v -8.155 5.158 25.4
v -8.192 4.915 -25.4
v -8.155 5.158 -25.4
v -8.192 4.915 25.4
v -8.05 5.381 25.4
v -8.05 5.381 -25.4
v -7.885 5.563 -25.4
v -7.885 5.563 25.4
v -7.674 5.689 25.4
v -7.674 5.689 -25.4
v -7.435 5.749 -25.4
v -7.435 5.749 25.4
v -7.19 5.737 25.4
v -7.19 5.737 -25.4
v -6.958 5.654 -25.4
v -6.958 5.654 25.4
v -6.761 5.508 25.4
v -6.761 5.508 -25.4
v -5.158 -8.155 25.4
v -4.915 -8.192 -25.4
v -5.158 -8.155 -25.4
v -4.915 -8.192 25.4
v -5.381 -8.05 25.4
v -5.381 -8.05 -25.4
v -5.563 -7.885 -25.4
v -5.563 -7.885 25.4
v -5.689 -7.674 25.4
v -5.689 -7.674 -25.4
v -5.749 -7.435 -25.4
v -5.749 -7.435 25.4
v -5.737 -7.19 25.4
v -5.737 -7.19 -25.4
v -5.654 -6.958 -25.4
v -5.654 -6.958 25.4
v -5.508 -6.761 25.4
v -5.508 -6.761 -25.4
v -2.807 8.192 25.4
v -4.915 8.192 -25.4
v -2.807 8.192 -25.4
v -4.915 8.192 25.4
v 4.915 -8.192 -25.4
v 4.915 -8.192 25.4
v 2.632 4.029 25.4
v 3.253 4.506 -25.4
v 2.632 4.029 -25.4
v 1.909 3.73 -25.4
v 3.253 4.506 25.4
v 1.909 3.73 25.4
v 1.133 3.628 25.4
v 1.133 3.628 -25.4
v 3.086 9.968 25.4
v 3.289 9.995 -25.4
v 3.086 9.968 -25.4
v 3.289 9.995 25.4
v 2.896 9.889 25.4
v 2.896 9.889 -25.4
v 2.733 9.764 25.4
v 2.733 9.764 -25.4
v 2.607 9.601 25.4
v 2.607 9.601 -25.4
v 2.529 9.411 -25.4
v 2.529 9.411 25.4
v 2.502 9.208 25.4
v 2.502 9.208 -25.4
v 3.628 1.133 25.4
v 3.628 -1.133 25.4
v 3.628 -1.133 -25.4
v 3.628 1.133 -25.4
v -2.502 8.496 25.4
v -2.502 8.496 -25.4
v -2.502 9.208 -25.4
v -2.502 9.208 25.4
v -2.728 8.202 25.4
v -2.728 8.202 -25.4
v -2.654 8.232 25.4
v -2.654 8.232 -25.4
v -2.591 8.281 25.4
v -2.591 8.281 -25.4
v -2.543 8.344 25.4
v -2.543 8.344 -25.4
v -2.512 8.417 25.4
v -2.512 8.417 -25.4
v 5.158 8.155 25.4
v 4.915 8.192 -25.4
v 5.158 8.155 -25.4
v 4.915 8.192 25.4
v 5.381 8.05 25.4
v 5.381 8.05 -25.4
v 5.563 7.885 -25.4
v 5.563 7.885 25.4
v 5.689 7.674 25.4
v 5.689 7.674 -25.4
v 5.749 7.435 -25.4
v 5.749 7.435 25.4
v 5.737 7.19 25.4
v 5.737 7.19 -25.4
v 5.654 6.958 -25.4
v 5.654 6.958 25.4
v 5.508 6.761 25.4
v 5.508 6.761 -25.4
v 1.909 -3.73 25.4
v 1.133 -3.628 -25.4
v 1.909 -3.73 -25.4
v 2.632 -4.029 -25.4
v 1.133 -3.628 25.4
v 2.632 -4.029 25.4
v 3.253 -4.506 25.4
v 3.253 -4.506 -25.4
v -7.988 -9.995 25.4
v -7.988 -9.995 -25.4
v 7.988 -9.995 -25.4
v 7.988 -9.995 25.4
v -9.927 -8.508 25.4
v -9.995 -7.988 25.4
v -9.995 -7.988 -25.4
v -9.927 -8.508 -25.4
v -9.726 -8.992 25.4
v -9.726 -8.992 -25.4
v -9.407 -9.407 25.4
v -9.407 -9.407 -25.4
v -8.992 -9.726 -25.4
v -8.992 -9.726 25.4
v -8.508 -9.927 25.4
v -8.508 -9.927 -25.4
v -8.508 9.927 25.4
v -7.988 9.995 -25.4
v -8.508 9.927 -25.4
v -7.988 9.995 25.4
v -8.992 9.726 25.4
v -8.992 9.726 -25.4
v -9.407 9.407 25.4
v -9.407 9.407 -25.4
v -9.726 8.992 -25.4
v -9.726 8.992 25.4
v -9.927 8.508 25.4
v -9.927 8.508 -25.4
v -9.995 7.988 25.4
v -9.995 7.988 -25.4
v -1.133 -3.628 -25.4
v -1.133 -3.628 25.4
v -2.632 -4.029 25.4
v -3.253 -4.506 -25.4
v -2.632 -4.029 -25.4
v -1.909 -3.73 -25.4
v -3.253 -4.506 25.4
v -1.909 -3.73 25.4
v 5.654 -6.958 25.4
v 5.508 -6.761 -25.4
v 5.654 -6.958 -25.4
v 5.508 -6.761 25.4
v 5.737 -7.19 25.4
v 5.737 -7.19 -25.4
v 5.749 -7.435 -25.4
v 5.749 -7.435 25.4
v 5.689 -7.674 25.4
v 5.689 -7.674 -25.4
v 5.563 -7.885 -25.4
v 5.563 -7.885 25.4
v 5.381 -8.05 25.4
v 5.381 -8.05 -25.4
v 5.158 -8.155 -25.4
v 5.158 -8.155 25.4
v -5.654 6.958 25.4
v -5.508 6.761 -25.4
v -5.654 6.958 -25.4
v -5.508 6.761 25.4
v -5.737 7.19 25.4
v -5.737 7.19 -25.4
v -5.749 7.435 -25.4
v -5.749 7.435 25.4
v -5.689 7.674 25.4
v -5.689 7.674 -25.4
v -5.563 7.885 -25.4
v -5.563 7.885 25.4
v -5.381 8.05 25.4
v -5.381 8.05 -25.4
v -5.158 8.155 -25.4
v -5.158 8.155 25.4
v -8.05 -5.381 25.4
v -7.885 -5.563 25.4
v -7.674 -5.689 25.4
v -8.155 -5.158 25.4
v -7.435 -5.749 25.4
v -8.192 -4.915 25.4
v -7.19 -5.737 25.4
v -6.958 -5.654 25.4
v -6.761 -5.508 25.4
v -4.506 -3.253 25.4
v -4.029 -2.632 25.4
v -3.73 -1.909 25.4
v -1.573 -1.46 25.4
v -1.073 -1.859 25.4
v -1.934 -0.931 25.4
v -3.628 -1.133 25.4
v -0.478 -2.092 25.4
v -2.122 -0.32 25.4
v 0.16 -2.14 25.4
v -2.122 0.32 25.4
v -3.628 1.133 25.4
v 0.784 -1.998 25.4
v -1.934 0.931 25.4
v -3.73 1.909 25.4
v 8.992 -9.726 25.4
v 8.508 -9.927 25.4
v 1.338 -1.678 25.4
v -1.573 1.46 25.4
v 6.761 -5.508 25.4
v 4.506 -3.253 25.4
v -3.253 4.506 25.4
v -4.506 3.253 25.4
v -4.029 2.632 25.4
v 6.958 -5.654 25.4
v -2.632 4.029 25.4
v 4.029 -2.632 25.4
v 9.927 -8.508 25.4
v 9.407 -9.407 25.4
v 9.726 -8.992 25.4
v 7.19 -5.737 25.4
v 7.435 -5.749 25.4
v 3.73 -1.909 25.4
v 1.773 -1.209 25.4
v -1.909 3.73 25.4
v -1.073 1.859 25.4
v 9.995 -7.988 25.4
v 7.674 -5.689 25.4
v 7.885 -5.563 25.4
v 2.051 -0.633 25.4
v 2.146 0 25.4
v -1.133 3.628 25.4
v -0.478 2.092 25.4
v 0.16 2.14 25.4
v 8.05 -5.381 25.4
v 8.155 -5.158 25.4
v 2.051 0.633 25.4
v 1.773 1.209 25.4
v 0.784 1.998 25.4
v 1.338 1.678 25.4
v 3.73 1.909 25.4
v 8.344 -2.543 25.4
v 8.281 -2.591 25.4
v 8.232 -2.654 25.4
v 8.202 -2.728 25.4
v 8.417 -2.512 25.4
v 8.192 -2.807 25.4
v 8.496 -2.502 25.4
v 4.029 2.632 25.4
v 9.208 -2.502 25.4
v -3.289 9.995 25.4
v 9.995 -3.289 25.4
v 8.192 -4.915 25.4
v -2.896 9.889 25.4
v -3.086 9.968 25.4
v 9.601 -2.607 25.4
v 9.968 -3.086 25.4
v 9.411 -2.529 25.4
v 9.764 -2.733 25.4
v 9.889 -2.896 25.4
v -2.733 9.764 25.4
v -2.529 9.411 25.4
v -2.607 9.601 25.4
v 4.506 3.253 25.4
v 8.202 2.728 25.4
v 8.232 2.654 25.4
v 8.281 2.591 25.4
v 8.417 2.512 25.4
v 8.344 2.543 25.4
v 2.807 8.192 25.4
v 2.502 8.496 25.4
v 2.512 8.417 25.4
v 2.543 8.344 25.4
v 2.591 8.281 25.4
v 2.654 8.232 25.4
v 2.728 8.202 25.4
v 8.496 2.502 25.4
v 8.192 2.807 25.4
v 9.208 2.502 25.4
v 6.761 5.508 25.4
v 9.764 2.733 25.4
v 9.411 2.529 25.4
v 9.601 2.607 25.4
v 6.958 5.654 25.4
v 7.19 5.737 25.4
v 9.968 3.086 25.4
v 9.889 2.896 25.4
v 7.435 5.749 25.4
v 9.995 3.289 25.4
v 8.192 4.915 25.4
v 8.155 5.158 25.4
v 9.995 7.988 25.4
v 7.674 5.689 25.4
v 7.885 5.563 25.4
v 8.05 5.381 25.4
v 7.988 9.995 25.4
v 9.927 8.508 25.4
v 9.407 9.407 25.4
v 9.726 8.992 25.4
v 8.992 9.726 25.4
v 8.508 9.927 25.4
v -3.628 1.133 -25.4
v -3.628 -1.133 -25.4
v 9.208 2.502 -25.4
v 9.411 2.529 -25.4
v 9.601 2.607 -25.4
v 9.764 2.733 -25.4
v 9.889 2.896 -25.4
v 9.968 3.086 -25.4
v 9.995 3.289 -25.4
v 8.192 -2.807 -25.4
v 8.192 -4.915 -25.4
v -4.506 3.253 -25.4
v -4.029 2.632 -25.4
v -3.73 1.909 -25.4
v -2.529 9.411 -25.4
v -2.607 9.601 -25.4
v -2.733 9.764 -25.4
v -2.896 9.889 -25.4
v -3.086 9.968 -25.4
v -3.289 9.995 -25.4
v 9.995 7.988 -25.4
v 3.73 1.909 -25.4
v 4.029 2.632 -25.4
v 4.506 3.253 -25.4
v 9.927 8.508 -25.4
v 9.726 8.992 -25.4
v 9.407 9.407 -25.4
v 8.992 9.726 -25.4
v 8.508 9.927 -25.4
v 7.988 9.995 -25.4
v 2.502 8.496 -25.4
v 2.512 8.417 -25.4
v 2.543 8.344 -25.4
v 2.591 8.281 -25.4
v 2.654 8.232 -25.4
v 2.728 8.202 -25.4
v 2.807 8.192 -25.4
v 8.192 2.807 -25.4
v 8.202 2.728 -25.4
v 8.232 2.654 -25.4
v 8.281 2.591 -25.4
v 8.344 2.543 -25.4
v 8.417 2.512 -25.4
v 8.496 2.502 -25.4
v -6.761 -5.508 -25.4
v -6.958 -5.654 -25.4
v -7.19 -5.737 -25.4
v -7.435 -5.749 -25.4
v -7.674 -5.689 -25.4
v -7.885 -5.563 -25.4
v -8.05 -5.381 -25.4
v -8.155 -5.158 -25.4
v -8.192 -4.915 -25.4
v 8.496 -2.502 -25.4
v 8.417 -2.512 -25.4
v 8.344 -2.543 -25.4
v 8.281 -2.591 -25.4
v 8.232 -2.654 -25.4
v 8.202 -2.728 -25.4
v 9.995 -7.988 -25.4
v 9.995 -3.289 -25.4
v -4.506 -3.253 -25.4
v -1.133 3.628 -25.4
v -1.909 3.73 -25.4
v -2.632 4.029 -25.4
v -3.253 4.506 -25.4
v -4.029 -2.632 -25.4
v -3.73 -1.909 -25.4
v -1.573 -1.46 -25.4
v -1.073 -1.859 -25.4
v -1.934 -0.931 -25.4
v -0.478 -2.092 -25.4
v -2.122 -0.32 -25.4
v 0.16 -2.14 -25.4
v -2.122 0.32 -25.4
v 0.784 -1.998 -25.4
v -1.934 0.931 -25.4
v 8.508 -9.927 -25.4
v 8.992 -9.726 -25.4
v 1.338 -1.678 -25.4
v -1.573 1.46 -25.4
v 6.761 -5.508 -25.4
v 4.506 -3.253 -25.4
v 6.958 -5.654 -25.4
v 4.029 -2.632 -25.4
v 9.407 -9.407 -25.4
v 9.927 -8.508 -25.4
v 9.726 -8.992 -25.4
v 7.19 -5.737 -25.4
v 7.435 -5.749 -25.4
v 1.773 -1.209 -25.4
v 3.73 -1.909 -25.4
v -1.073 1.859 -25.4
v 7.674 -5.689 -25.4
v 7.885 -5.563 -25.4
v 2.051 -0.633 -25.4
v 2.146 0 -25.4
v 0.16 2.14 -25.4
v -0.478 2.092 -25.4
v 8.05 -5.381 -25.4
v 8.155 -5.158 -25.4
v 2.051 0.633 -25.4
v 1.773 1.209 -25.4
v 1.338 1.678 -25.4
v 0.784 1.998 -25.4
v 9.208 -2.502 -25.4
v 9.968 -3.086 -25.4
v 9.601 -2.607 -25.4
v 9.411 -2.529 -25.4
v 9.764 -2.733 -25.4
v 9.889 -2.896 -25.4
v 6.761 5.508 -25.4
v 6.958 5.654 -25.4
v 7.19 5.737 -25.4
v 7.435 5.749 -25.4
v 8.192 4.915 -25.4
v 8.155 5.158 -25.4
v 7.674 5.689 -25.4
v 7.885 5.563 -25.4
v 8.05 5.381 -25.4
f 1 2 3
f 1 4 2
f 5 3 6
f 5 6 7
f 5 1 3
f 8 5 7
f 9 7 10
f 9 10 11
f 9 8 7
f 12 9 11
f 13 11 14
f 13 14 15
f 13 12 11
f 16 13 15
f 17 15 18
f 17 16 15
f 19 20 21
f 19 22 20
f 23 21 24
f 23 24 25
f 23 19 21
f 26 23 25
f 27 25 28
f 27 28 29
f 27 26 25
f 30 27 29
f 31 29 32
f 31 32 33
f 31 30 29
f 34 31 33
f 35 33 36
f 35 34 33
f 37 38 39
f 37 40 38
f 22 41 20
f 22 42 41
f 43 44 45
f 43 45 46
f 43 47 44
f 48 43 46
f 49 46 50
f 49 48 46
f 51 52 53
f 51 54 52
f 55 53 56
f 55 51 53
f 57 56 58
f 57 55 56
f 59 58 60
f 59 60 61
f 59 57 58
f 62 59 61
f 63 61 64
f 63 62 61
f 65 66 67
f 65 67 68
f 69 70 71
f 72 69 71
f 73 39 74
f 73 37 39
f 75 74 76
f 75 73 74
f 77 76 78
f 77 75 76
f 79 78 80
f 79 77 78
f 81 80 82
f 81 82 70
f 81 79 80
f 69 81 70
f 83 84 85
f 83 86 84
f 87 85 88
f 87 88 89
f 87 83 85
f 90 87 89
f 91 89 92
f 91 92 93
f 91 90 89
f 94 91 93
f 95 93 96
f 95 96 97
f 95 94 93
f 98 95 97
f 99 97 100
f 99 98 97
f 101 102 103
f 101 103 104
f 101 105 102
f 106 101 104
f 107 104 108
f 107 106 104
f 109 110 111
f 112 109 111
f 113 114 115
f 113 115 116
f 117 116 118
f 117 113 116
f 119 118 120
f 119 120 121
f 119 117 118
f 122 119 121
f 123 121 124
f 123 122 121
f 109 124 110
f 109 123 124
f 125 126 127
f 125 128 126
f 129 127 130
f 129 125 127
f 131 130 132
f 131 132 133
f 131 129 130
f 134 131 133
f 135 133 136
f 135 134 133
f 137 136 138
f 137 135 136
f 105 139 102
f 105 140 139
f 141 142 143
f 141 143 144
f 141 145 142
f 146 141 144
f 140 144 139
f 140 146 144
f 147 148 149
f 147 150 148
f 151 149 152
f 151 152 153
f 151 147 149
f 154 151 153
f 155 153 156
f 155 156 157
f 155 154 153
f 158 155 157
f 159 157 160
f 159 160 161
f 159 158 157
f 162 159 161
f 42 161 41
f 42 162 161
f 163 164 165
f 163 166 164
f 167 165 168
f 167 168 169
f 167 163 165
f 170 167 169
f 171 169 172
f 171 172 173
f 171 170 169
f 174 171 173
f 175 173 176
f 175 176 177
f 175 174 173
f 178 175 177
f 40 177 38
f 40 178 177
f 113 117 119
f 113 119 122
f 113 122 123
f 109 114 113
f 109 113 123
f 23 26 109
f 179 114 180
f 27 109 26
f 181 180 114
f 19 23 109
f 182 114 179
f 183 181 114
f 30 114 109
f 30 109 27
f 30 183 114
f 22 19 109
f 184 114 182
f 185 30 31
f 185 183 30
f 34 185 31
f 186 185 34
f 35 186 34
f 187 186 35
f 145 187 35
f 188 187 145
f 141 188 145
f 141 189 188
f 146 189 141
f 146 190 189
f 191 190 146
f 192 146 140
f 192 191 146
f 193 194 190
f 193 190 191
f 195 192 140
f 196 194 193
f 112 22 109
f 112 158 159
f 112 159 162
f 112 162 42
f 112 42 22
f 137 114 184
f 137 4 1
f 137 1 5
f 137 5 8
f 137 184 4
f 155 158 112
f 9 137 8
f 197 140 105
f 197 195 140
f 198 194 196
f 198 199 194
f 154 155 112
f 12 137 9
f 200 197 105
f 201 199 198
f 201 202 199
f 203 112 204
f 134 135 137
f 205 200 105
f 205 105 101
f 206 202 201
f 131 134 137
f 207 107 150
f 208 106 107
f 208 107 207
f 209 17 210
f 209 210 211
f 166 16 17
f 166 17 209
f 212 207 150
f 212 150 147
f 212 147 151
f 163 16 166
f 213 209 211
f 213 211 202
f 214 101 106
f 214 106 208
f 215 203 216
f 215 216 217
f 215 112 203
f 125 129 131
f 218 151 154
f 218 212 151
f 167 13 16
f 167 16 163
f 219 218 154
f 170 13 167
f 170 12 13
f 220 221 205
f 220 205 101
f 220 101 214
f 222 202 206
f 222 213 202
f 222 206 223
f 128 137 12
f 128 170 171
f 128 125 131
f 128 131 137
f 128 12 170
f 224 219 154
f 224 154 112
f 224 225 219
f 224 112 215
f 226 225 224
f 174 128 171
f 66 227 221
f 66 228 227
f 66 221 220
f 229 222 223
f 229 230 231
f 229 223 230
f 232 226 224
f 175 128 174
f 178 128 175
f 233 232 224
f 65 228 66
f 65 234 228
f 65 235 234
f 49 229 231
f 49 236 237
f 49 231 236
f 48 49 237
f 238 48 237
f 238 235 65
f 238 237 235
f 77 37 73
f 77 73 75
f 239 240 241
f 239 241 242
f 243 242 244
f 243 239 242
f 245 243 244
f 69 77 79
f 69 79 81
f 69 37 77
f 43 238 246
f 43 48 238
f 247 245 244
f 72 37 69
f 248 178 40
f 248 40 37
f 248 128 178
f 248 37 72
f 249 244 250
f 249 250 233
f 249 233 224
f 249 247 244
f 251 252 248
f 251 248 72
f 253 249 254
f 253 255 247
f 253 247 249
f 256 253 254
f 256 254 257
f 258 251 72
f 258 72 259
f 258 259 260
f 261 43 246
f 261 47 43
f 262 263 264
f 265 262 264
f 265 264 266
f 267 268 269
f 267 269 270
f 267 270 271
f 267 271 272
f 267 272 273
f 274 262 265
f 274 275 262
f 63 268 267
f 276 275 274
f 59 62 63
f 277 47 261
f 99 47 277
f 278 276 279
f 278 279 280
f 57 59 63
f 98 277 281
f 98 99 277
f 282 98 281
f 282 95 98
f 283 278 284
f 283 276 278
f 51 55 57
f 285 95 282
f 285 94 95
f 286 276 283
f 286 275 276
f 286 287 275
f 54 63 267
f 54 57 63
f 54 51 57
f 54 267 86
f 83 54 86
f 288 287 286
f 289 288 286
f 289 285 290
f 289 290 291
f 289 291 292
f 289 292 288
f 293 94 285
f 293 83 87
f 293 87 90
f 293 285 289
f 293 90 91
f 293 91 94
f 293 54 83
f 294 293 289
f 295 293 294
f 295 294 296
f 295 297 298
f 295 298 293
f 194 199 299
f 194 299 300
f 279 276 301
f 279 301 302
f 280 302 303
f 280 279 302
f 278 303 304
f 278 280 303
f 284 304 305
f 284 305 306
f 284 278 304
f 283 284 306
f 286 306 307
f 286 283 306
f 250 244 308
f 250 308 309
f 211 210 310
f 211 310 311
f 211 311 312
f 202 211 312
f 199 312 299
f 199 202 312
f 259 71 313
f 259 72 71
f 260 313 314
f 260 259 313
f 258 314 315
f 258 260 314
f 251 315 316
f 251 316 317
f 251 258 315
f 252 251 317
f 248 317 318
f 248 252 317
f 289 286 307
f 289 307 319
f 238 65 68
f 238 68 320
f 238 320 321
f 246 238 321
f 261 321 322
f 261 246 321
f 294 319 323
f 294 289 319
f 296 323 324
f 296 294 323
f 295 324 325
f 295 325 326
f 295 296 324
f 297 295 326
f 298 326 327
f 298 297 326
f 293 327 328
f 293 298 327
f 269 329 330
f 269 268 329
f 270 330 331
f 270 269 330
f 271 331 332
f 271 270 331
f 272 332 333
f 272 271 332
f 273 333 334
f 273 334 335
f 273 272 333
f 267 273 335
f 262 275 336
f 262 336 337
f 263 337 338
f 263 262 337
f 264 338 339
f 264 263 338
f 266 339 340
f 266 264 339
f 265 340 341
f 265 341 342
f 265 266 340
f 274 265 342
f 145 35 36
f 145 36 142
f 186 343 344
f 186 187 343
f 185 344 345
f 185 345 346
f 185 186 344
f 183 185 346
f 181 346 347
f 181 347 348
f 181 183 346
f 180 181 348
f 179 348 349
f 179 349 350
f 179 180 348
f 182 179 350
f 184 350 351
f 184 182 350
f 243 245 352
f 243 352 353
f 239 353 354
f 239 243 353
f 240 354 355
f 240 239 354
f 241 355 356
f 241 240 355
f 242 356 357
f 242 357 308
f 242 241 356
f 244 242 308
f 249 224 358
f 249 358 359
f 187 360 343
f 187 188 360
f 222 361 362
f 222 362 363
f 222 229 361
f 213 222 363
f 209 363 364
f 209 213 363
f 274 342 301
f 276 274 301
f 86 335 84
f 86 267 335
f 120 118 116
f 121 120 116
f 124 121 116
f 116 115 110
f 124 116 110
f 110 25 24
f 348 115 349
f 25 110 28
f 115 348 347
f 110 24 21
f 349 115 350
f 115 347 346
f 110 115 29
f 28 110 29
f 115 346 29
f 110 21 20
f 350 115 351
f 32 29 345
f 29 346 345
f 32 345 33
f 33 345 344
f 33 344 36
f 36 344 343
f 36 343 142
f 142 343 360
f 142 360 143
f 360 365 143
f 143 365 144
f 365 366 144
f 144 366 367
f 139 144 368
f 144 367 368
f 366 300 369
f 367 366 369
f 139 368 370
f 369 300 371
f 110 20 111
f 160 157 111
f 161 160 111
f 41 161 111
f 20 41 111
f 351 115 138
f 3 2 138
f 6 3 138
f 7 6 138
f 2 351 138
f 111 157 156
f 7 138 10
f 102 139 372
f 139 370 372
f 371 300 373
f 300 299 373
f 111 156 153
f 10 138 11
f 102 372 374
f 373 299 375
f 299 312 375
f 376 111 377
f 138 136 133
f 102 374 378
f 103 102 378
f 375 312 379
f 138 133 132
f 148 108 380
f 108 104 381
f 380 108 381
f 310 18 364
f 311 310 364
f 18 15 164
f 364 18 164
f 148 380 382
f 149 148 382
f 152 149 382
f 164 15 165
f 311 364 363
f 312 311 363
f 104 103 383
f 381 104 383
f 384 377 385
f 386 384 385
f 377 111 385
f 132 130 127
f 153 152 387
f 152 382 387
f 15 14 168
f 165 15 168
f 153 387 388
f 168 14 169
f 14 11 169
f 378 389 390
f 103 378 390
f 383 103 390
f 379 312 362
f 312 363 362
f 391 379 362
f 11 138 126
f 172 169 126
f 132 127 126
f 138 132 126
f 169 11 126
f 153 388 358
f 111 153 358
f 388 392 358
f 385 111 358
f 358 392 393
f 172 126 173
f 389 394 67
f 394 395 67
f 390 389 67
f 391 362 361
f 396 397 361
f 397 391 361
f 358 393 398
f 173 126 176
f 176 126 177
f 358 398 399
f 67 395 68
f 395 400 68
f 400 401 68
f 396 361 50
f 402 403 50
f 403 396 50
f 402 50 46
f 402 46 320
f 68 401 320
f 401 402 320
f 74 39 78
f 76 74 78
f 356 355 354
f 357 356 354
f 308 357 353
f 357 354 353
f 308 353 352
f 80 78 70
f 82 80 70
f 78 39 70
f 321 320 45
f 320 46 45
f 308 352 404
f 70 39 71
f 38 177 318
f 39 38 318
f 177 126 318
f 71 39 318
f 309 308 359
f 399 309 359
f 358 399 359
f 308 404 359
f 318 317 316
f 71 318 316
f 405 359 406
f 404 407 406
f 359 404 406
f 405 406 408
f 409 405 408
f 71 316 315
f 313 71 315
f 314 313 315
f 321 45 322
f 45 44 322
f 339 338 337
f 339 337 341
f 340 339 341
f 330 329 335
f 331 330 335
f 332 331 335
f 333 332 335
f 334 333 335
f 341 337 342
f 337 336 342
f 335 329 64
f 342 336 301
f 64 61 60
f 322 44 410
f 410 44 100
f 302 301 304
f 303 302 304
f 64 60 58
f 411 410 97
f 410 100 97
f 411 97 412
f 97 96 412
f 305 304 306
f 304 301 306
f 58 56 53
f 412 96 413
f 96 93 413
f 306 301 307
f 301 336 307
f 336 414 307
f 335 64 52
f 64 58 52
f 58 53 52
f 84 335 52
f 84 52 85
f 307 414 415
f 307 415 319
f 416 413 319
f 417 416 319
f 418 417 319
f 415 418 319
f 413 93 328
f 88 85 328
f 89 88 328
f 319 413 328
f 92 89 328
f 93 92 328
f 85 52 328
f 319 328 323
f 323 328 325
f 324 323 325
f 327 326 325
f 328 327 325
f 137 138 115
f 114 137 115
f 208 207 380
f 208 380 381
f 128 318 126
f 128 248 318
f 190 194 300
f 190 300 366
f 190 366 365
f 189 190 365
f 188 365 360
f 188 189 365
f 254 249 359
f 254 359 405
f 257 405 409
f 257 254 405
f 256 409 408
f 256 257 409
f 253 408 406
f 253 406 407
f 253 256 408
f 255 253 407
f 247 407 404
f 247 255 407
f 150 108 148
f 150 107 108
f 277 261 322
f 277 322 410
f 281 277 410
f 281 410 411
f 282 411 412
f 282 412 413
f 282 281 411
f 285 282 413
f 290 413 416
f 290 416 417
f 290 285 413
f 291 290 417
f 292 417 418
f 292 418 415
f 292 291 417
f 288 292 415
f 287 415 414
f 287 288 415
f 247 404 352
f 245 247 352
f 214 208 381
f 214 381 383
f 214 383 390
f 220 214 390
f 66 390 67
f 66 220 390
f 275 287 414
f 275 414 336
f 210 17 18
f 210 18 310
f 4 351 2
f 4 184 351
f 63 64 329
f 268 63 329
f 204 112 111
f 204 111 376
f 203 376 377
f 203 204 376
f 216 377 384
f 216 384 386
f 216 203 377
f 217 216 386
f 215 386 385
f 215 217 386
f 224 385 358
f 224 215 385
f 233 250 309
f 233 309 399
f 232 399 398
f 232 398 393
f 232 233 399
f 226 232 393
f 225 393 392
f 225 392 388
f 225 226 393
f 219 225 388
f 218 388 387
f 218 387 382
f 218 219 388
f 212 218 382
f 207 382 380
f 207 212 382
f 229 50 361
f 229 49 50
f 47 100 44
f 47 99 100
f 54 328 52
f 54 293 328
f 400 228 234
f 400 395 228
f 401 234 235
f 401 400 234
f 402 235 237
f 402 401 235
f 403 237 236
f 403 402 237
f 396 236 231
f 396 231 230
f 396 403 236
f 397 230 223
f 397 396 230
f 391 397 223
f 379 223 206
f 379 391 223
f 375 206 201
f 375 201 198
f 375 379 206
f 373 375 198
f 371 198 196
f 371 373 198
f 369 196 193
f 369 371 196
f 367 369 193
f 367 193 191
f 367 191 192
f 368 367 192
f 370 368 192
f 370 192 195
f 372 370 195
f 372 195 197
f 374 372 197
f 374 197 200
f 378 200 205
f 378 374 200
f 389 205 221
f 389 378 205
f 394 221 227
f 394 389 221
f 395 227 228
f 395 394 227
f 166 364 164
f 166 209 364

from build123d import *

# Parameters (mm, degrees)
SKETCH1_R           = 2.1463
BOSS_EXTRUDE1_DEPTH = 25.4


with BuildPart() as part:
    # Sketch1 → Boss-Extrude1 (new, symmetric)
    with BuildSketch(Plane.XY):
        with BuildLine():
            Line((-9.9949, 7.9883), (-9.9949, -7.9883))
            ThreePointArc((-9.9949, -7.9883), (-9.407180467, -9.407180467), (-7.9883, -9.9949))
            Line((-7.9883, -9.9949), (7.9883, -9.9949))
            ThreePointArc((7.9883, -9.9949), (9.407180467, -9.407180467), (9.9949, -7.9883))
            Line((9.9949, -7.9883), (9.9949, -3.2893))
            ThreePointArc((9.9949, -3.2893), (9.76427588, -2.73252412), (9.2075, -2.5019))
            Line((9.2075, -2.5019), (8.4963, -2.5019))
            ThreePointArc((8.4963, -2.5019), (8.280773853, -2.591173853), (8.1915, -2.8067))
            Line((8.1915, -2.8067), (8.1915, -4.9149))
            ThreePointArc((8.1915, -4.9149), (7.674065253, -5.689295824), (6.760603096, -5.507596904))
            Line((6.760603096, -5.507596904), (4.505765747, -3.252759555))
            ThreePointArc((4.505765747, -3.252759555), (3.856054457, -2.280397894), (3.627906192, -1.133419111))
            Line((3.627906192, -1.133419111), (3.627906192, 1.133419111))
            ThreePointArc((3.627906192, 1.133419111), (3.856054457, 2.280397894), (4.505765747, 3.252759555))
            Line((4.505765747, 3.252759555), (6.760603096, 5.507596904))
            ThreePointArc((6.760603096, 5.507596904), (7.674065253, 5.689295824), (8.1915, 4.9149))
            Line((8.1915, 4.9149), (8.1915, 2.8067))
            ThreePointArc((8.1915, 2.8067), (8.280773853, 2.591173853), (8.4963, 2.5019))
            Line((8.4963, 2.5019), (9.2075, 2.5019))
            ThreePointArc((9.2075, 2.5019), (9.76427588, 2.73252412), (9.9949, 3.2893))
            Line((9.9949, 3.2893), (9.9949, 7.9883))
            ThreePointArc((9.9949, 7.9883), (9.407180467, 9.407180467), (7.9883, 9.9949))
            Line((7.9883, 9.9949), (3.2893, 9.9949))
            ThreePointArc((3.2893, 9.9949), (2.73252412, 9.76427588), (2.5019, 9.2075))
            Line((2.5019, 9.2075), (2.5019, 8.4963))
            ThreePointArc((2.5019, 8.4963), (2.591173853, 8.280773853), (2.8067, 8.1915))
            Line((2.8067, 8.1915), (4.9149, 8.1915))
            ThreePointArc((4.9149, 8.1915), (5.689295824, 7.674065253), (5.507596904, 6.760603096))
            Line((5.507596904, 6.760603096), (3.252759555, 4.505765747))
            ThreePointArc((3.252759555, 4.505765747), (2.280397894, 3.856054457), (1.133419111, 3.627906192))
            Line((1.133419111, 3.627906192), (-1.133419111, 3.627906192))
            ThreePointArc((-1.133419111, 3.627906192), (-2.280397894, 3.856054457), (-3.252759555, 4.505765747))
            Line((-3.252759555, 4.505765747), (-5.507596904, 6.760603096))
            ThreePointArc((-5.507596904, 6.760603096), (-5.689295824, 7.674065253), (-4.9149, 8.1915))
            Line((-4.9149, 8.1915), (-2.8067, 8.1915))
            ThreePointArc((-2.8067, 8.1915), (-2.591173853, 8.280773853), (-2.5019, 8.4963))
            Line((-2.5019, 8.4963), (-2.5019, 9.2075))
            ThreePointArc((-2.5019, 9.2075), (-2.73252412, 9.76427588), (-3.2893, 9.9949))
            Line((-3.2893, 9.9949), (-7.9883, 9.9949))
            ThreePointArc((-7.9883, 9.9949), (-9.407180467, 9.407180467), (-9.9949, 7.9883))
        make_face()
        Circle(SKETCH1_R, mode=Mode.SUBTRACT)
        with BuildLine():
            Line((-6.760603096, 5.507596904), (-4.505765747, 3.252759555))
            ThreePointArc((-4.505765747, 3.252759555), (-3.856054457, 2.280397894), (-3.627906192, 1.133419111))
            Line((-3.627906192, 1.133419111), (-3.627906192, -1.133419111))
            ThreePointArc((-3.627906192, -1.133419111), (-3.856054457, -2.280397894), (-4.505765747, -3.252759555))
            Line((-4.505765747, -3.252759555), (-6.760603096, -5.507596904))
            ThreePointArc((-6.760603096, -5.507596904), (-7.674065253, -5.689295824), (-8.1915, -4.9149))
            Line((-8.1915, -4.9149), (-8.1915, 4.9149))
            ThreePointArc((-8.1915, 4.9149), (-7.674065253, 5.689295824), (-6.760603096, 5.507596904))
        make_face(mode=Mode.SUBTRACT)
        with BuildLine():
            Line((-5.507596904, -6.760603096), (-3.252759555, -4.505765747))
            ThreePointArc((-3.252759555, -4.505765747), (-2.280397894, -3.856054457), (-1.133419111, -3.627906192))
            Line((-1.133419111, -3.627906192), (1.133419111, -3.627906192))
            ThreePointArc((1.133419111, -3.627906192), (2.280397894, -3.856054457), (3.252759555, -4.505765747))
            Line((3.252759555, -4.505765747), (5.507596904, -6.760603096))
            ThreePointArc((5.507596904, -6.760603096), (5.689295824, -7.674065253), (4.9149, -8.1915))
            Line((4.9149, -8.1915), (-4.9149, -8.1915))
            ThreePointArc((-4.9149, -8.1915), (-5.689295824, -7.674065253), (-5.507596904, -6.760603096))
        make_face(mode=Mode.SUBTRACT)
    extrude(amount=BOSS_EXTRUDE1_DEPTH, both=True)


solid = part.part
